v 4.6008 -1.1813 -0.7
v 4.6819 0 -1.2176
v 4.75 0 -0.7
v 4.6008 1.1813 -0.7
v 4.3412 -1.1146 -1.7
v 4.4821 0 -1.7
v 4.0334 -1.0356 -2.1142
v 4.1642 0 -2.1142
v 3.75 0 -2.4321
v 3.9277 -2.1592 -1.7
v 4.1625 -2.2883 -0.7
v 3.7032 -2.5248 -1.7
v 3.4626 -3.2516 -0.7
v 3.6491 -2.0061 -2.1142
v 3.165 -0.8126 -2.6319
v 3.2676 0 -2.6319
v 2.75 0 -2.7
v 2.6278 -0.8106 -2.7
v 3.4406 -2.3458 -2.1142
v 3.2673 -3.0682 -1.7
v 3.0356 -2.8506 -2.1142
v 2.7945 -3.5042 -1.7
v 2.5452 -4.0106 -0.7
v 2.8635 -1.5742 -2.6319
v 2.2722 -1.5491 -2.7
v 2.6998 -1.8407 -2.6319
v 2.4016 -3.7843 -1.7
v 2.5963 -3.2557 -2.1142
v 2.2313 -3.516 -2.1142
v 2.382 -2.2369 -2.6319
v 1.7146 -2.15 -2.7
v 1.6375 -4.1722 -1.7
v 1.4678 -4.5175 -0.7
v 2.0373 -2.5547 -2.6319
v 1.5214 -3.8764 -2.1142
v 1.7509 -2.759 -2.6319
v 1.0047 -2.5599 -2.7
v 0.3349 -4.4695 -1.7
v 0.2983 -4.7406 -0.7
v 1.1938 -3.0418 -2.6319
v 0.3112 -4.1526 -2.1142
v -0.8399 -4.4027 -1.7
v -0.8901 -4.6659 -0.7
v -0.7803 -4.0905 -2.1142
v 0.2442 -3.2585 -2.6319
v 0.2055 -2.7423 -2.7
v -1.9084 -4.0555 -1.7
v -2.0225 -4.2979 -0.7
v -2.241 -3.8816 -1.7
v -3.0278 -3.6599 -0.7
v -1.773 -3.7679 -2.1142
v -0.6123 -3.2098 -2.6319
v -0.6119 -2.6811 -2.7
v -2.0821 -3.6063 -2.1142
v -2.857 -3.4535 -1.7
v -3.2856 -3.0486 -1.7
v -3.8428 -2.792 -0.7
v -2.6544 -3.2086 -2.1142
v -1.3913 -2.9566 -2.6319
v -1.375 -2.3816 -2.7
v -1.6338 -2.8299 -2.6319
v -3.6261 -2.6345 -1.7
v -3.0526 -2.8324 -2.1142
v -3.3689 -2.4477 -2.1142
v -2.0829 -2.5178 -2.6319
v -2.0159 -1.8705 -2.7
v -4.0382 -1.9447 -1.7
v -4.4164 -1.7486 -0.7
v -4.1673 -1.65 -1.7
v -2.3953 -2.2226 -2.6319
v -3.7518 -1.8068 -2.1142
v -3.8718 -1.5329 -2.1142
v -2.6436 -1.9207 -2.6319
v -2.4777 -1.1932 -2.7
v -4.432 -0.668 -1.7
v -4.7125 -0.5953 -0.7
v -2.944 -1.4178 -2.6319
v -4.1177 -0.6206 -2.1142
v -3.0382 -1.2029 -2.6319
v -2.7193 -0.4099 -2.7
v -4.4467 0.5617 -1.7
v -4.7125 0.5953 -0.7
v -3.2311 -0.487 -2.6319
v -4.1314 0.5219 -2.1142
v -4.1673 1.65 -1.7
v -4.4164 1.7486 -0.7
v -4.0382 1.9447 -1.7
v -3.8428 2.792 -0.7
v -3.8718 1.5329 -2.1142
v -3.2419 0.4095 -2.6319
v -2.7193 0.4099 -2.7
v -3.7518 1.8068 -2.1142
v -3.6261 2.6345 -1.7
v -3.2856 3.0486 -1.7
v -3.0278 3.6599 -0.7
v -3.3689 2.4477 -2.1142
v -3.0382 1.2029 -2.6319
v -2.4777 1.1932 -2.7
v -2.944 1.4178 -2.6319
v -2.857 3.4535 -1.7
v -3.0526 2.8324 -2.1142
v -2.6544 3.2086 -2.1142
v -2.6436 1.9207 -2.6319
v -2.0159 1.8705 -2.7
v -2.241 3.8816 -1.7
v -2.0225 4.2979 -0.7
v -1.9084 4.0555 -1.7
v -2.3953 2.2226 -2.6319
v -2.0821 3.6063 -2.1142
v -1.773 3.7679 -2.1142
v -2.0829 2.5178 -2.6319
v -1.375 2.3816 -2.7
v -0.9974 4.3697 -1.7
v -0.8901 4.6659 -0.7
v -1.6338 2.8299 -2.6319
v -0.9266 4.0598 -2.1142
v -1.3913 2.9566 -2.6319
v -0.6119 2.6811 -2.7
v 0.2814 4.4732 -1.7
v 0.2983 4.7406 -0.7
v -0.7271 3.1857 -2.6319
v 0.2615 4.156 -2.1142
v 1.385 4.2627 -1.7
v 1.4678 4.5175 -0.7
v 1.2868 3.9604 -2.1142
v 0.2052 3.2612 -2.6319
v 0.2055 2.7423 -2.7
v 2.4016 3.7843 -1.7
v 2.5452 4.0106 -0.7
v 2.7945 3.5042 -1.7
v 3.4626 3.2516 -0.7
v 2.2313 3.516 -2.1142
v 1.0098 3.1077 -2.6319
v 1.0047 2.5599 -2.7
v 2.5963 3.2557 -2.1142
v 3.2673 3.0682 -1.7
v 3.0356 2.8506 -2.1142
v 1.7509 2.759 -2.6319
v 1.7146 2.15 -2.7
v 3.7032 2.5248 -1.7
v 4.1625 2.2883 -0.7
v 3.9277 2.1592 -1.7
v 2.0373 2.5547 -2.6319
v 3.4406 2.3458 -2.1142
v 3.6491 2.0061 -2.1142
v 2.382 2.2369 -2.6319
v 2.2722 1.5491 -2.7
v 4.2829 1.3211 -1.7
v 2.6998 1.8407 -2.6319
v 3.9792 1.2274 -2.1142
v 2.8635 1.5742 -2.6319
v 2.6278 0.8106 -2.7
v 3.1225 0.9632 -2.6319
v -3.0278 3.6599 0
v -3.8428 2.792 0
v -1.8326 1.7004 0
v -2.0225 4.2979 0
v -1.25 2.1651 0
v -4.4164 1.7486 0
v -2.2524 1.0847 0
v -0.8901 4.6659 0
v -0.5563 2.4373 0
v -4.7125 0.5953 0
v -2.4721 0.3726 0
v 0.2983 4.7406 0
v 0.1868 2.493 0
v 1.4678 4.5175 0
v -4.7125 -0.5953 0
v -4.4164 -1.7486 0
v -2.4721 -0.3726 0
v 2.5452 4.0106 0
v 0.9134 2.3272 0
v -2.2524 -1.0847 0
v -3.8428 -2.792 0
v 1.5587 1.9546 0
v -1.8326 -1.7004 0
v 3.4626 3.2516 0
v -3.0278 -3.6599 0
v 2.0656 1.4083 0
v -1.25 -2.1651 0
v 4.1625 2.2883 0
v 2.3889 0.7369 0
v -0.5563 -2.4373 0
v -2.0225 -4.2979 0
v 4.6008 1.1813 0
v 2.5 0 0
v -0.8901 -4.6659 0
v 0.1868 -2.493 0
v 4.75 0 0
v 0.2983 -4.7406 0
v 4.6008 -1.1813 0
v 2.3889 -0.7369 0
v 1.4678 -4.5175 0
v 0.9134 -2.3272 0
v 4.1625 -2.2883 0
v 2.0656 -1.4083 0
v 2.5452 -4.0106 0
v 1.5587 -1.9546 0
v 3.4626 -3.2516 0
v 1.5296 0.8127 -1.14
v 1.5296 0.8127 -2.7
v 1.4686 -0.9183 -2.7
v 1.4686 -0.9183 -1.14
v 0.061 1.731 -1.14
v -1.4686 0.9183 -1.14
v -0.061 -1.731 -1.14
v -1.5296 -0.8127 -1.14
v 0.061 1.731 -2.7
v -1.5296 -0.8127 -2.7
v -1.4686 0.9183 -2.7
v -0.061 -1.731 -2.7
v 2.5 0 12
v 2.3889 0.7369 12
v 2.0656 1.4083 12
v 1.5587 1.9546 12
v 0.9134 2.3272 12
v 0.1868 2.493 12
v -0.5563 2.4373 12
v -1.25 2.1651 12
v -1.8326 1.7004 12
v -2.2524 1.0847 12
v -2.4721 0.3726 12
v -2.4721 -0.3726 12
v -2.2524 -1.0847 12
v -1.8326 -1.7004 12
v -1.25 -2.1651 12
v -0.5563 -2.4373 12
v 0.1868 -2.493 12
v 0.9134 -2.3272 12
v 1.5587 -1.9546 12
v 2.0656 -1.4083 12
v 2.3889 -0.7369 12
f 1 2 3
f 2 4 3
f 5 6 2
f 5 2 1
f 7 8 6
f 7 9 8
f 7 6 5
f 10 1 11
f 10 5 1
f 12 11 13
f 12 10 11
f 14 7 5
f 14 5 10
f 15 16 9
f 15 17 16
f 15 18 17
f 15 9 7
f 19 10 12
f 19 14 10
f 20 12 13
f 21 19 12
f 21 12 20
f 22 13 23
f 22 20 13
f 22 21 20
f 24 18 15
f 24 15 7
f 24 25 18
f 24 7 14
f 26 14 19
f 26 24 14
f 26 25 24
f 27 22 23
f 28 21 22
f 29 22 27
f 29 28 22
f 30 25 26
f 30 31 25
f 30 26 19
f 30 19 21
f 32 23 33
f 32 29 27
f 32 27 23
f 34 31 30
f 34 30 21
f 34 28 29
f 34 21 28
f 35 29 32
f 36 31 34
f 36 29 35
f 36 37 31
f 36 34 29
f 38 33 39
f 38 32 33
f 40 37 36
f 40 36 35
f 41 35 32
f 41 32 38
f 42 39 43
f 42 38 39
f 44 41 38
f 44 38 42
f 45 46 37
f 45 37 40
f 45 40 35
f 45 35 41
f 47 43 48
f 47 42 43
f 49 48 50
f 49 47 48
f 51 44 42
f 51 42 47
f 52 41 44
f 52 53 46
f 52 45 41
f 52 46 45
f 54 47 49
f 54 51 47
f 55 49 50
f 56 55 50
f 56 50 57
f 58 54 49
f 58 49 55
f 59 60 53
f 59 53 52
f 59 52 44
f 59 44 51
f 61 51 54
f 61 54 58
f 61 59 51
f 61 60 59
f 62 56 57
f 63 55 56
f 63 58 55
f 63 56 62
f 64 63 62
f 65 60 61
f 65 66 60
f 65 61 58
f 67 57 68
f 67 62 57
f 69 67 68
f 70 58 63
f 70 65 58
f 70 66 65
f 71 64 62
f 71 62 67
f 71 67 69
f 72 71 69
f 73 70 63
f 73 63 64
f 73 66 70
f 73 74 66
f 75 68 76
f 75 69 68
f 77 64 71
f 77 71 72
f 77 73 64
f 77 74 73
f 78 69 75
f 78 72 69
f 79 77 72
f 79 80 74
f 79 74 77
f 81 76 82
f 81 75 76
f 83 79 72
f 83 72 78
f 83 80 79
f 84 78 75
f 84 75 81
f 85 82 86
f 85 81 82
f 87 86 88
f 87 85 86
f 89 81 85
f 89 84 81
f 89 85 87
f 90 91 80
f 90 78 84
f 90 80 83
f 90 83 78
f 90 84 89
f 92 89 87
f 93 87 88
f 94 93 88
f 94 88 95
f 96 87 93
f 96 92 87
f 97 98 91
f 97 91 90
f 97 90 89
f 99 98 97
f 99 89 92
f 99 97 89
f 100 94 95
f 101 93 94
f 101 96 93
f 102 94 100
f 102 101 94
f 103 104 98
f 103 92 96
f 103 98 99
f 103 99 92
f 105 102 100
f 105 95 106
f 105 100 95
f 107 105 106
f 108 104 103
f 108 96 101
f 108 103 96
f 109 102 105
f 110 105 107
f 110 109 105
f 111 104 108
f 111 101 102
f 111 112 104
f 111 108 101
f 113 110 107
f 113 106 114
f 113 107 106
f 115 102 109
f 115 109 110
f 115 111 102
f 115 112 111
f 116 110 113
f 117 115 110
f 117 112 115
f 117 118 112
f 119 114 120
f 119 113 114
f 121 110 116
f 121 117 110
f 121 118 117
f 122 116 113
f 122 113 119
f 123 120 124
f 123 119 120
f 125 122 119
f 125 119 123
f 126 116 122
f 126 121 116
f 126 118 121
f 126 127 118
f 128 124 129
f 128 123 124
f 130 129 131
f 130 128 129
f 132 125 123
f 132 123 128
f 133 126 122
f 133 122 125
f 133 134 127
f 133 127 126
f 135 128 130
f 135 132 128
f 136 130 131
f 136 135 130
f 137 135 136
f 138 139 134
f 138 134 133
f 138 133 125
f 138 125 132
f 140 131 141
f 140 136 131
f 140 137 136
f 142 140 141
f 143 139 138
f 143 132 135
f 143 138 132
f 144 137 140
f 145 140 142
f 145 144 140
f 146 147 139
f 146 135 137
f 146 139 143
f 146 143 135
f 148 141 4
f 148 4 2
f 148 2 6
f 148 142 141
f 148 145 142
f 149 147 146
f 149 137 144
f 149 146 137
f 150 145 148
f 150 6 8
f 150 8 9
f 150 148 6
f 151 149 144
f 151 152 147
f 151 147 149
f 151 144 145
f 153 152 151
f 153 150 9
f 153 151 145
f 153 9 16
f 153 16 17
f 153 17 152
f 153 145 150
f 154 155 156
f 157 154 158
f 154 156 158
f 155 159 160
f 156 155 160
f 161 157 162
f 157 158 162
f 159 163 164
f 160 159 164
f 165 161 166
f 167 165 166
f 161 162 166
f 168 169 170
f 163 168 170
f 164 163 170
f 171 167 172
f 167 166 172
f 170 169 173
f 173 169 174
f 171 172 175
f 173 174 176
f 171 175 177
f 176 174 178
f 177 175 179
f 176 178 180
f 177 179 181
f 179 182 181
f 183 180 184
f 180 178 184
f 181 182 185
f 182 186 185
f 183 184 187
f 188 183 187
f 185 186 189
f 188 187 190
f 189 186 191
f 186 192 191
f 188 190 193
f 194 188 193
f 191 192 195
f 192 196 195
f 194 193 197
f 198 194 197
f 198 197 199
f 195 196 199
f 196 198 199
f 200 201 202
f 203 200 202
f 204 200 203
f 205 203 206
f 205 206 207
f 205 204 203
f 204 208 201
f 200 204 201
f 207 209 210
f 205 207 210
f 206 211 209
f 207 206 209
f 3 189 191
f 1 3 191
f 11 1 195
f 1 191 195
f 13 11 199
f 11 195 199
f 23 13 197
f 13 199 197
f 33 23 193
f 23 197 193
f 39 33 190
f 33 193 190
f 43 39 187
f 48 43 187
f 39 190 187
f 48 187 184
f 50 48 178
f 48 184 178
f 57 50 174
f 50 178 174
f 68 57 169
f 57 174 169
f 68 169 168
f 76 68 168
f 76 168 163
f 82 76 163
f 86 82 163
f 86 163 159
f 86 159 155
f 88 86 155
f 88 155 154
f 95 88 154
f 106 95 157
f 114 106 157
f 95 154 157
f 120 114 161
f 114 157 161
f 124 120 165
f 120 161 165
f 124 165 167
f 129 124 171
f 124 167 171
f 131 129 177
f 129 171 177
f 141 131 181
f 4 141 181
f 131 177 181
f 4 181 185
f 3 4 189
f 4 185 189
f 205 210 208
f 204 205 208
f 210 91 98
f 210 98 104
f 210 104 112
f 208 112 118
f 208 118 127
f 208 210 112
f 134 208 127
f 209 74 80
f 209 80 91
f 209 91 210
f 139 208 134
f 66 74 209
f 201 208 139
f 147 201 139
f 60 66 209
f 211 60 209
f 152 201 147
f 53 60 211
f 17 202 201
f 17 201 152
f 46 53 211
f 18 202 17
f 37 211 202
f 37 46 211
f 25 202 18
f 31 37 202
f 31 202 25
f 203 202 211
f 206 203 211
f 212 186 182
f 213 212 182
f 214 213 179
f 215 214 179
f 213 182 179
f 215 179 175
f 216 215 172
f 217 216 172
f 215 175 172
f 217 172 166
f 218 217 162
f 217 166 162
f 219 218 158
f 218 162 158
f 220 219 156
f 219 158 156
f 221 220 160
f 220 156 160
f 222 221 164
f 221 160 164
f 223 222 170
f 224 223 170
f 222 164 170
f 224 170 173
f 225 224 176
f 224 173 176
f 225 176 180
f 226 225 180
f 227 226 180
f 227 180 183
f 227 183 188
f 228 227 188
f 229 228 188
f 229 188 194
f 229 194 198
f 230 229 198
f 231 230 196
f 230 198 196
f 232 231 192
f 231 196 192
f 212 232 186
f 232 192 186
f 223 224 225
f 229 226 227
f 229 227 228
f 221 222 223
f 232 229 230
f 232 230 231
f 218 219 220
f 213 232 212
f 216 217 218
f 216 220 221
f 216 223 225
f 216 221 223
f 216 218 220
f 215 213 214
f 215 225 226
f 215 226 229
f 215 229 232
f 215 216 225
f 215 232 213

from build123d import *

# Parameters (mm, degrees)
SKETCH_1_R          = 2.5
EXTRUDE_1_DEPTH     = 12
SKETCH_2_R          = 4.75
EXTRUDE_2_DEPTH     = 2.7
FILLET_1_R          = 2
CUT_EXTRUDE_1_DEPTH = 1.56


with BuildPart() as part:
    # 草图1 → 凸台-拉伸1 (new body)
    with BuildSketch(Plane.XY):
        Circle(SKETCH_1_R)
    extrude(amount=EXTRUDE_1_DEPTH)

    # 草图2 → 凸台-拉伸2 (add)
    with BuildSketch(Plane(origin=(0, 0, 0), x_dir=(-1, 0, 0), z_dir=(0, 0, -1))):
        with Locations(Location((0, 0, 0), (0, 0, 180))):
            Circle(SKETCH_2_R)
    extrude(amount=EXTRUDE_2_DEPTH)

    # 圆角1
    fillet_1_edges = [part.edges().sort_by_distance(p)[0] for p in [
        (-4.75, 0, -2.7),
    ]]
    fillet(fillet_1_edges, radius=FILLET_1_R)

    # 草图3 → 切除-拉伸1 (cut)
    with BuildSketch(Plane(origin=(0, 0, -2.7), x_dir=(-1, 0, 0), z_dir=(0, 0, -1))):
        Polygon((1.468584034, 0.918292401), (-0.06097253, 1.730977282), (-1.529556565, 0.812684881), (-1.468584034, -0.918292401), (0.06097253, -1.730977282), (1.529556565, -0.812684881), align=None)
    extrude(amount=-CUT_EXTRUDE_1_DEPTH, mode=Mode.SUBTRACT)


solid = part.part
